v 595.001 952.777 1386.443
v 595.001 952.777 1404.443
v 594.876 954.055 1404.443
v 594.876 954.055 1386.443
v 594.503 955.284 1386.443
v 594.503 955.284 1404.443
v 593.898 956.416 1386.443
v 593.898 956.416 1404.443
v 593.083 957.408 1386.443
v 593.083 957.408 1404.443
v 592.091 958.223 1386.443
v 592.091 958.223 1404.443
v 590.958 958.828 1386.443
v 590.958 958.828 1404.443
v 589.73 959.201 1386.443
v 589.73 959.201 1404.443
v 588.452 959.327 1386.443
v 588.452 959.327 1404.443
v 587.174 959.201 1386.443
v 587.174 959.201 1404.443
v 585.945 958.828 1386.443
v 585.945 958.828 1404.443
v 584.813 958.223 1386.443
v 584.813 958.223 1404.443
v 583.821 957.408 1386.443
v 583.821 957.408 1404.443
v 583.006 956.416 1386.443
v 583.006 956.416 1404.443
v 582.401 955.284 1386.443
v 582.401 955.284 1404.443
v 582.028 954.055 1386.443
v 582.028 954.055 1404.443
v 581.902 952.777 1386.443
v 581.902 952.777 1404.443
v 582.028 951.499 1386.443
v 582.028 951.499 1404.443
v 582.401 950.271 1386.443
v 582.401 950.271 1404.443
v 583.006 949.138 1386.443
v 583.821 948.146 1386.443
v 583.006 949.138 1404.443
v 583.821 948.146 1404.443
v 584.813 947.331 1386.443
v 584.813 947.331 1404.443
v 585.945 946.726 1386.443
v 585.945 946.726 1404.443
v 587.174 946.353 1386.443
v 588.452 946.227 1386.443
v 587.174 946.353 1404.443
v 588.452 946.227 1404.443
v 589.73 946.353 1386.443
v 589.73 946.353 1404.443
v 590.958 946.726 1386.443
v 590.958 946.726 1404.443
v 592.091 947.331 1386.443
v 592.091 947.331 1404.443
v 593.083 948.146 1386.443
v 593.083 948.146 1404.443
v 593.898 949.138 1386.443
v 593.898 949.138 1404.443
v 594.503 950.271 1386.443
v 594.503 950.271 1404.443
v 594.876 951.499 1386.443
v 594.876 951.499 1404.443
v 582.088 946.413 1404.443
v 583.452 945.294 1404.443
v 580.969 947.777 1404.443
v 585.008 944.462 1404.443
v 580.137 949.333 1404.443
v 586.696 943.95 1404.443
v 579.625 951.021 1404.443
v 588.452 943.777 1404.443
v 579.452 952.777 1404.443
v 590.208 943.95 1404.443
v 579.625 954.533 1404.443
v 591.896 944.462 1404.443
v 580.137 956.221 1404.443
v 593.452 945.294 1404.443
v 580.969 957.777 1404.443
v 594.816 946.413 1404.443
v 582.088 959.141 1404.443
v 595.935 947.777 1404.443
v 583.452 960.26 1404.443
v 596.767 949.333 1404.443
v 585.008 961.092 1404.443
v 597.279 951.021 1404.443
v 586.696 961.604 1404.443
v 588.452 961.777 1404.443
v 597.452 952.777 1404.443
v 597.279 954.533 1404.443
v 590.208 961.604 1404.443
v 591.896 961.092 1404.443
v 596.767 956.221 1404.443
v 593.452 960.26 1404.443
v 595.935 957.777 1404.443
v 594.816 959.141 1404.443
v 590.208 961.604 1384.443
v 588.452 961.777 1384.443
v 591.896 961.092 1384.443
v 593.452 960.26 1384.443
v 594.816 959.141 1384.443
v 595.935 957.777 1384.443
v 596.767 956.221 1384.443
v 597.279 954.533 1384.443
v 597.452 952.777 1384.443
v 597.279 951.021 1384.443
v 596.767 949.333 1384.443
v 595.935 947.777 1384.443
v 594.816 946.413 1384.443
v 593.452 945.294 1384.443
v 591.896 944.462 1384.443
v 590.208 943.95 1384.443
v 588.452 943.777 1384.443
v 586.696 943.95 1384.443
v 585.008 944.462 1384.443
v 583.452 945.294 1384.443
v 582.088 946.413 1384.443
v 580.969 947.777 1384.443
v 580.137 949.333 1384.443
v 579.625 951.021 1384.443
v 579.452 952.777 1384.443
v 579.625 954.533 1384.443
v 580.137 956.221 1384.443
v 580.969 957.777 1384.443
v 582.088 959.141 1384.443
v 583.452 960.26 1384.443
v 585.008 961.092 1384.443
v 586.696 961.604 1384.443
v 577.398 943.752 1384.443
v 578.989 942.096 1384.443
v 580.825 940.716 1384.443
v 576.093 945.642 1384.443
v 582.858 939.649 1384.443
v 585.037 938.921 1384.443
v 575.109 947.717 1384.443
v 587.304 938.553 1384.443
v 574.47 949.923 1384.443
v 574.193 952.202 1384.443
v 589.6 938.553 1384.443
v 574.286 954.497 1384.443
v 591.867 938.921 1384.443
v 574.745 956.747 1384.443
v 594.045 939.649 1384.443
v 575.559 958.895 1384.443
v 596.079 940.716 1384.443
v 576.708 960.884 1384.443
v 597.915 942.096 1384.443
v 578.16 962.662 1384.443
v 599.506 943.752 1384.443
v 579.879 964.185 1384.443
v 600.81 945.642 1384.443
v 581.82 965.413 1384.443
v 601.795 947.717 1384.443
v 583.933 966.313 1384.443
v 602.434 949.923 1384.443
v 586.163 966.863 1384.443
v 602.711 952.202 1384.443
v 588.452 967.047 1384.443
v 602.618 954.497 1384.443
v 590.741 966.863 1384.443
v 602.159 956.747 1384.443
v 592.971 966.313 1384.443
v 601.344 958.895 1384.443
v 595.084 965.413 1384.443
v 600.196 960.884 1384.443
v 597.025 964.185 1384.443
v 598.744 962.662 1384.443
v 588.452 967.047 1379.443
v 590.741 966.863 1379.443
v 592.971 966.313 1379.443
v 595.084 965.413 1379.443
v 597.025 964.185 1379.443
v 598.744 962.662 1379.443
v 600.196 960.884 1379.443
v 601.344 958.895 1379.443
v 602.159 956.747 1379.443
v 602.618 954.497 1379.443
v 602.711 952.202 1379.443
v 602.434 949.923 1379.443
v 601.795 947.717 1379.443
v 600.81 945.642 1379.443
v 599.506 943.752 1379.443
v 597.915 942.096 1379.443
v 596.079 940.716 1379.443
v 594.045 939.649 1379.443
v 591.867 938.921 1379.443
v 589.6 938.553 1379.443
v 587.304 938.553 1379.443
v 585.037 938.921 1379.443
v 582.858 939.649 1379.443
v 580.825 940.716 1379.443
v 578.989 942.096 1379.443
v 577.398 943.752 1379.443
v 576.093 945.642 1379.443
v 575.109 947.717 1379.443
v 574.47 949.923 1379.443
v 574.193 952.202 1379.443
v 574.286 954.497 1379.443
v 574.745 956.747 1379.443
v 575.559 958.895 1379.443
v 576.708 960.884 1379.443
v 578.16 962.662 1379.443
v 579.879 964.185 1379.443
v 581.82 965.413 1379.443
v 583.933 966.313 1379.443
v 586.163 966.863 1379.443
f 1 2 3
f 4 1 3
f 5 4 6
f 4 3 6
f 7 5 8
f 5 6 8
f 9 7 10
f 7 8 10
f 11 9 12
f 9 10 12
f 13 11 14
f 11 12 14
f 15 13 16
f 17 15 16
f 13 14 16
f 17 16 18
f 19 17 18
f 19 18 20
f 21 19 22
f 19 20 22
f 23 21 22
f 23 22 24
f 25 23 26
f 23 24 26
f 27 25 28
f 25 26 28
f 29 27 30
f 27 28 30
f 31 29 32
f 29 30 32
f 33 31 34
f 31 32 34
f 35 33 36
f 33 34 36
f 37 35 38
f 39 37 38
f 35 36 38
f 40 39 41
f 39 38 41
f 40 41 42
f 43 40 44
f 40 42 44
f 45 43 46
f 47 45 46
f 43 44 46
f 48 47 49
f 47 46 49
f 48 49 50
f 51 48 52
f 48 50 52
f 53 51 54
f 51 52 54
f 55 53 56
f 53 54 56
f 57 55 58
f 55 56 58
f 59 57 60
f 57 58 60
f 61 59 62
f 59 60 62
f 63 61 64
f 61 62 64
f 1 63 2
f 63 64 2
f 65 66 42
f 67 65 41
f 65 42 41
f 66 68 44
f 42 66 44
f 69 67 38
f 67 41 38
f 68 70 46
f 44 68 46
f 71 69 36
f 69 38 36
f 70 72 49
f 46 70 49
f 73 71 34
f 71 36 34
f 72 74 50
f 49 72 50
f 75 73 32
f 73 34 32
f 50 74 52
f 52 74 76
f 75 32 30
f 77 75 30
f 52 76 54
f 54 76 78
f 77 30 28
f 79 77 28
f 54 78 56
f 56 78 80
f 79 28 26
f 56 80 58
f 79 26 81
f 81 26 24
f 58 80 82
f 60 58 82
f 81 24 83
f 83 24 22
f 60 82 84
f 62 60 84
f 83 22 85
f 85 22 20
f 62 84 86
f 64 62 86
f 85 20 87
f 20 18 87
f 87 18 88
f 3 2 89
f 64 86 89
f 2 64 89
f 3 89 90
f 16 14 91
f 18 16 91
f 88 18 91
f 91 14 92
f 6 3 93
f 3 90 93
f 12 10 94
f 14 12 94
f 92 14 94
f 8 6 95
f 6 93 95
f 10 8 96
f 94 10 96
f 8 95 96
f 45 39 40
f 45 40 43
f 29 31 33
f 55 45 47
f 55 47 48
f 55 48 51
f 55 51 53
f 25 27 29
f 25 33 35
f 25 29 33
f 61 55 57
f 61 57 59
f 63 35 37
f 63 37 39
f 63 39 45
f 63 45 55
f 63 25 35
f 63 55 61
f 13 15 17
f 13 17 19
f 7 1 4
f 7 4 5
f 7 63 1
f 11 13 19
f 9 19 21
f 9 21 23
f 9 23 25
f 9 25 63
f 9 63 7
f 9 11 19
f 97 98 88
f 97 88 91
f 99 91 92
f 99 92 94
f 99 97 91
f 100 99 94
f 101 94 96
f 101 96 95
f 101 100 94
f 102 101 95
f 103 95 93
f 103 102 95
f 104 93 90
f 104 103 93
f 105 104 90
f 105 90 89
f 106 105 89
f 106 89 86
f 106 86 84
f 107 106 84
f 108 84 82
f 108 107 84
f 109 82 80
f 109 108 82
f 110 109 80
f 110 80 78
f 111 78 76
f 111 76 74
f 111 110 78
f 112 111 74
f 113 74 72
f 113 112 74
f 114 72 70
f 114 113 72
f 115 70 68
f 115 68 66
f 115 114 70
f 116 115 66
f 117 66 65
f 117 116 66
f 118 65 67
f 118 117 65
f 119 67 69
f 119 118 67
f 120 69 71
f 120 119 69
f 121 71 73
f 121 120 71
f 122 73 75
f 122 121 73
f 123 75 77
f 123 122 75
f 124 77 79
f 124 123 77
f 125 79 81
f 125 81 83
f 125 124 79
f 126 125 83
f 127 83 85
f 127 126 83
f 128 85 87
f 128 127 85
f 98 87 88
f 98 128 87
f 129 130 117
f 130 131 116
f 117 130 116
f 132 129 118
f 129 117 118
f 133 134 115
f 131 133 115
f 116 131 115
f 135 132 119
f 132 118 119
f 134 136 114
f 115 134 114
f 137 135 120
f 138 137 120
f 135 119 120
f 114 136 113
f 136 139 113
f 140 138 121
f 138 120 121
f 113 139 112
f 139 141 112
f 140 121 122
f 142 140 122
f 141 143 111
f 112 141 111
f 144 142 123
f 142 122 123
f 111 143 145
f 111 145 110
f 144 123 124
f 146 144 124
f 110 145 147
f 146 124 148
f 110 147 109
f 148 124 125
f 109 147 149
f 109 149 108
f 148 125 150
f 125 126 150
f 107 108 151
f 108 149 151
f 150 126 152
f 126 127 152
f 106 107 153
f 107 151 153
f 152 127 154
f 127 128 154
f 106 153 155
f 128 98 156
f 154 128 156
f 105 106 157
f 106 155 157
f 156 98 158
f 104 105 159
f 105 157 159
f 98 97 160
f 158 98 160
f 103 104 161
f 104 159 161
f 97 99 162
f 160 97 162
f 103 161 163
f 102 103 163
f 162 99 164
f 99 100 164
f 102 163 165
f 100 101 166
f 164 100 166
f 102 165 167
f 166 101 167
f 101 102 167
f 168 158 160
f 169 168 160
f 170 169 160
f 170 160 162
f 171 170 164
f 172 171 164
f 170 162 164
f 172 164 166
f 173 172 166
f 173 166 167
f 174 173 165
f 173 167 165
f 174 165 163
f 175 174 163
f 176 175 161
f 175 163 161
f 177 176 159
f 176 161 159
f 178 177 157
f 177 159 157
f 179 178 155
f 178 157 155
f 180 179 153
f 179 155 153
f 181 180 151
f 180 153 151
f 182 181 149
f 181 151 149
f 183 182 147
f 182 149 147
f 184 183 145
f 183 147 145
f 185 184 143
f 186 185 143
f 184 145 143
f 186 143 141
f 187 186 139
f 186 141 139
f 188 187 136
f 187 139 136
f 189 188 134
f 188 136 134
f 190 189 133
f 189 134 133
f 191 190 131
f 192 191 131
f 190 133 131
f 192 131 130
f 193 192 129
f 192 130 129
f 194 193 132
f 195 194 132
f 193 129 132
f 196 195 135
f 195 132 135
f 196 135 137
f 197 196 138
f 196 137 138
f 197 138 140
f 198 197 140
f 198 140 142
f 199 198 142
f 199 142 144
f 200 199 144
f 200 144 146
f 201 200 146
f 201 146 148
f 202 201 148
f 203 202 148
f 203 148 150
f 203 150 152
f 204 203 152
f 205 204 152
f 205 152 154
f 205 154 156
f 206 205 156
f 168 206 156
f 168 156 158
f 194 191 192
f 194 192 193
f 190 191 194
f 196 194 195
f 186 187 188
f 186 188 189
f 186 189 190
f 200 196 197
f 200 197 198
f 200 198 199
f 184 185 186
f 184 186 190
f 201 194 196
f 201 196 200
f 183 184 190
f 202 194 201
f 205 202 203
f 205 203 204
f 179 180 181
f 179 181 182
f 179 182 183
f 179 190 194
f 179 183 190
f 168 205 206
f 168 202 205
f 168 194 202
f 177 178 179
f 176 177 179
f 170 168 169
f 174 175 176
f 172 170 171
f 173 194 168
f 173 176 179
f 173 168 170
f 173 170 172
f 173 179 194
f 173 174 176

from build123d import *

# Parameters (mm, degrees)
SKETCH1_R           = 8.999999998
BOSS_EXTRUDE1_DEPTH = 20
SKETCH2_R           = 14.270327874
BOSS_EXTRUDE2_DEPTH = 5
SKETCH3_R           = 6.549662412
CUT_EXTRUDE1_DEPTH  = 18


with BuildPart() as part:
    # Sketch1 → Boss-Extrude1 (new body)
    with BuildSketch(Plane(origin=(0, 0, 1384.443253532), x_dir=(-1, 0, 0), z_dir=(0, 0, -1))):
        with Locations(Location((-588.451811663, 952.777089149, 0), (0, 0, 90))):
            Circle(SKETCH1_R)
    extrude(amount=-BOSS_EXTRUDE1_DEPTH)

    # Sketch2 → Boss-Extrude2 (add)
    with BuildSketch(Plane(origin=(0, 0, 1384.443253532), x_dir=(-1, 0, 0), z_dir=(0, 0, -1))):
        with Locations(Location((-588.451811663, 952.777089149, 0), (0, 0, 90))):
            Circle(SKETCH2_R)
    extrude(amount=BOSS_EXTRUDE2_DEPTH)

    # Sketch3 → Cut-Extrude1 (cut)
    with BuildSketch(Plane.XY.offset(1404.443253532)):
        with Locations((588.451811663, 952.777089149)):
            Circle(SKETCH3_R)
    extrude(amount=-CUT_EXTRUDE1_DEPTH, mode=Mode.SUBTRACT)


solid = part.part
